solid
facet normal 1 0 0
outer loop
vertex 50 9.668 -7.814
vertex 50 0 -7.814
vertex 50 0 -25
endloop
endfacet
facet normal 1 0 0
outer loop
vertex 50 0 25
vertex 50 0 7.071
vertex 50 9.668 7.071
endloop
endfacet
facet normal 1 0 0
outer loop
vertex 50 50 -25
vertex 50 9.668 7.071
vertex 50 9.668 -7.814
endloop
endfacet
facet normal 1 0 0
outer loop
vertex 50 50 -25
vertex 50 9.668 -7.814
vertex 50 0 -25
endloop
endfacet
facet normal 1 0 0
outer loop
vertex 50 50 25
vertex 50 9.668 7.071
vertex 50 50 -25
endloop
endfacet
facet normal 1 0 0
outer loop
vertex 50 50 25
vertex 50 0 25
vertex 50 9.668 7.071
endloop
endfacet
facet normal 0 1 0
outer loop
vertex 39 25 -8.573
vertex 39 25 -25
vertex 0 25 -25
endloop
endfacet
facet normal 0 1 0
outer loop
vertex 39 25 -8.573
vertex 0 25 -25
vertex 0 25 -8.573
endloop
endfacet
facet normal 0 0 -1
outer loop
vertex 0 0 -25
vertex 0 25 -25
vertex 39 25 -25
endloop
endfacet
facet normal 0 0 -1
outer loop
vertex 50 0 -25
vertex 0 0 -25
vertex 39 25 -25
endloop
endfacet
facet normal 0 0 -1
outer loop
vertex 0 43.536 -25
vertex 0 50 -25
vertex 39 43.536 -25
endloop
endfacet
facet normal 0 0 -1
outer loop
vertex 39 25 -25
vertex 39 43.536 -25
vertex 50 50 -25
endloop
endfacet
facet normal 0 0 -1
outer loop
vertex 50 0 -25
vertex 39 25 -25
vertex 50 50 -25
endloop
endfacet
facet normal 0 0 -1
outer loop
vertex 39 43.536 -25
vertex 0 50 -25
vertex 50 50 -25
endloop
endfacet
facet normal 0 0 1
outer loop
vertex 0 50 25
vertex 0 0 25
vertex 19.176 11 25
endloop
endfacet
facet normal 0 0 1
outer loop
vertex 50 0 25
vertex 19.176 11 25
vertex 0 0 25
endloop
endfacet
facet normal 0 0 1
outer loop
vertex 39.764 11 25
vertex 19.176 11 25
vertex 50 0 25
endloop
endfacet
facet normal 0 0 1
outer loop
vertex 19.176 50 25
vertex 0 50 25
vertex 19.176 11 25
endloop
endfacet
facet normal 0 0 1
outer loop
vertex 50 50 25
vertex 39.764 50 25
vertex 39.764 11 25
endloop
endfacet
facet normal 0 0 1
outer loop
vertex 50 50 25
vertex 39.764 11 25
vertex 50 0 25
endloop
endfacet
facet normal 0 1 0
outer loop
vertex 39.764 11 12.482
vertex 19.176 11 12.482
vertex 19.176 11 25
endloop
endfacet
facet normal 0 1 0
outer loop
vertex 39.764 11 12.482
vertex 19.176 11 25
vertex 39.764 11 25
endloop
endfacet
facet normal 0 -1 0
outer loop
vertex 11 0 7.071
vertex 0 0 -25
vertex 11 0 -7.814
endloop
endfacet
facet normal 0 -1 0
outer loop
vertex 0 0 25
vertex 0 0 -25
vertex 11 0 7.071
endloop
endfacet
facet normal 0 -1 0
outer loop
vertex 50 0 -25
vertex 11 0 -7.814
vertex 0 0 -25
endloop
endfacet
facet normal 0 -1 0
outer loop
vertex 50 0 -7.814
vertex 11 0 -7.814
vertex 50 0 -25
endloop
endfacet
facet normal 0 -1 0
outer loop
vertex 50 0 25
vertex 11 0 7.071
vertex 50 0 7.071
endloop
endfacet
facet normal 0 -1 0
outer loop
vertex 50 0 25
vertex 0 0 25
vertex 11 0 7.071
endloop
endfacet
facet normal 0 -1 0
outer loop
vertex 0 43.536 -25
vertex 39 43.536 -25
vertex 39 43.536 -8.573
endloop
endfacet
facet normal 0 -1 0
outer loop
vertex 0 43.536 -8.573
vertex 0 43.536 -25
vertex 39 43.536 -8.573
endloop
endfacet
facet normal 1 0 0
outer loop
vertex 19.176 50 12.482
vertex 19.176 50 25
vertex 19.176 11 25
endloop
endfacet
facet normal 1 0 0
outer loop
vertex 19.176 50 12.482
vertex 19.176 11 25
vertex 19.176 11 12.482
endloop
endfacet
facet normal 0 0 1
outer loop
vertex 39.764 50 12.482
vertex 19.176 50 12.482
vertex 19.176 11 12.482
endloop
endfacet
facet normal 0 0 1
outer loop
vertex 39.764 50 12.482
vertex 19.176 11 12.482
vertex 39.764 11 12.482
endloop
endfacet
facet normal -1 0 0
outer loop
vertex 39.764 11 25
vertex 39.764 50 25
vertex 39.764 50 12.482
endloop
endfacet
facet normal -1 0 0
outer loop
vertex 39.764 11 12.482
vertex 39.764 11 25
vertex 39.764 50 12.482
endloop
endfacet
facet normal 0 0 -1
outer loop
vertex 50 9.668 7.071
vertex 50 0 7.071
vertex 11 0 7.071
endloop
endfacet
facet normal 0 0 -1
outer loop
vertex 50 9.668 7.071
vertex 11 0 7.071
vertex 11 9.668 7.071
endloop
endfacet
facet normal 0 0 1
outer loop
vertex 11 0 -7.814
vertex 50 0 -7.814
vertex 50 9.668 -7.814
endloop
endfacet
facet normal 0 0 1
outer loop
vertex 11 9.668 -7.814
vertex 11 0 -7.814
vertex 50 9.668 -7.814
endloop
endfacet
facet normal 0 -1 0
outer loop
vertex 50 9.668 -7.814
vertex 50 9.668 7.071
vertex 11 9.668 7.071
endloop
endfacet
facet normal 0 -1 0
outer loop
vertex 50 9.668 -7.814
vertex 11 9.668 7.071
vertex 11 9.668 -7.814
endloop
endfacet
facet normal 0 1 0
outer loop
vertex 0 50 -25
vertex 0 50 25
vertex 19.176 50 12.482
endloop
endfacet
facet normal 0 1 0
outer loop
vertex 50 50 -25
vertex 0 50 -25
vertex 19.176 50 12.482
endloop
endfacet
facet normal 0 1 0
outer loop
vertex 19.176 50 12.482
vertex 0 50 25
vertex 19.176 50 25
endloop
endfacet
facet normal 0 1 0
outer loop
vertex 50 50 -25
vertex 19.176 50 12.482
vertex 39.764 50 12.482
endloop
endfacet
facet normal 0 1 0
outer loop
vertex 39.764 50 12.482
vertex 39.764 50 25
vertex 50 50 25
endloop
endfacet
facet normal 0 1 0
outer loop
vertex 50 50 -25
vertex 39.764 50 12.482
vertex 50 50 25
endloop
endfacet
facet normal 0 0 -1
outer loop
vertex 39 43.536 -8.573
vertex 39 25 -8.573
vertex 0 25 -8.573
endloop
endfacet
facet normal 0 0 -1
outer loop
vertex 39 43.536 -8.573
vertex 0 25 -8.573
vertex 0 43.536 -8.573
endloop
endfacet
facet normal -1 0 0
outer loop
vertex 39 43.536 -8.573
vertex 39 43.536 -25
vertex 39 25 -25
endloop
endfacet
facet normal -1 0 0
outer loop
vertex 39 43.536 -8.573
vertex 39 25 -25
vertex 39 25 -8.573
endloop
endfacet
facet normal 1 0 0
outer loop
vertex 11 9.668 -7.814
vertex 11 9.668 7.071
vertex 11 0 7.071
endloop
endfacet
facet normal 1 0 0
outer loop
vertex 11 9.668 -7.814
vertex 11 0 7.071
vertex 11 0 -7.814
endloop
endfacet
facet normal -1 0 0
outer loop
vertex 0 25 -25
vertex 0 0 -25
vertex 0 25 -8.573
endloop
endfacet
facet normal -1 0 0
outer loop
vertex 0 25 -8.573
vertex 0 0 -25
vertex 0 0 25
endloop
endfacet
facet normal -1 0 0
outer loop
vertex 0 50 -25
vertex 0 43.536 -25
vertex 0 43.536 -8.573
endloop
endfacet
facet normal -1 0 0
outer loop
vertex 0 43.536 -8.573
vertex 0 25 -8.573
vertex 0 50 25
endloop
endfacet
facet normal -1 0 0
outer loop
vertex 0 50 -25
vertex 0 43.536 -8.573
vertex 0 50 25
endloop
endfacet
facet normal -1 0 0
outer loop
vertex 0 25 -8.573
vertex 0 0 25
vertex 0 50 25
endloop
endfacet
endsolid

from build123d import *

# Parameters (mm, degrees)
SKICA2_W                 = 50
SKICA2_H                 = 50
P_IDAT_VYSUNUT_M1_DEPTH  = 25
SKICA3_W                 = 20.588514008
SKICA3_H                 = 12.517673613
ODEBRAT_VYSUNUT_M1_DEPTH = 39
SKICA4_W                 = 14.884932554
SKICA4_H                 = 9.667623342
ODEBRAT_VYSUNUT_M2_DEPTH = 39
SKICA5_W                 = 16.426867347
SKICA5_H                 = 18.535662784
ODEBRAT_VYSUNUT_M3_DEPTH = 39


with BuildPart() as part:
    # Skica2 → Přidat vysunutím1 (new body, symmetric)
    with BuildSketch(Plane.XY):
        with Locations((25, 25)):
            Rectangle(SKICA2_W, SKICA2_H)
    extrude(amount=P_IDAT_VYSUNUT_M1_DEPTH, both=True)

    # Skica3 → Odebrat vysunutím1 (cut)
    with BuildSketch(Plane(origin=(0, 50, 0), x_dir=(1, 0, 0), z_dir=(0, 1, 0))):
        with Locations((29.470091853, -18.741163194)):
            Rectangle(SKICA3_W, SKICA3_H)
    extrude(amount=-ODEBRAT_VYSUNUT_M1_DEPTH, mode=Mode.SUBTRACT)

    # Skica4 → Odebrat vysunutím2 (cut)
    with BuildSketch(Plane(origin=(50, 0, 0), x_dir=(0, 0, -1), z_dir=(1, 0, 0))):
        with Locations((0.371136043, 4.833811671)):
            Rectangle(SKICA4_W, SKICA4_H)
    extrude(amount=-ODEBRAT_VYSUNUT_M2_DEPTH, mode=Mode.SUBTRACT)

    # Skica5 → Odebrat vysunutím3 (cut)
    with BuildSketch(Plane.ZY):
        with Locations((-16.786566327, 34.267831392)):
            Rectangle(SKICA5_W, SKICA5_H)
    extrude(amount=-ODEBRAT_VYSUNUT_M3_DEPTH, mode=Mode.SUBTRACT)


solid = part.part
